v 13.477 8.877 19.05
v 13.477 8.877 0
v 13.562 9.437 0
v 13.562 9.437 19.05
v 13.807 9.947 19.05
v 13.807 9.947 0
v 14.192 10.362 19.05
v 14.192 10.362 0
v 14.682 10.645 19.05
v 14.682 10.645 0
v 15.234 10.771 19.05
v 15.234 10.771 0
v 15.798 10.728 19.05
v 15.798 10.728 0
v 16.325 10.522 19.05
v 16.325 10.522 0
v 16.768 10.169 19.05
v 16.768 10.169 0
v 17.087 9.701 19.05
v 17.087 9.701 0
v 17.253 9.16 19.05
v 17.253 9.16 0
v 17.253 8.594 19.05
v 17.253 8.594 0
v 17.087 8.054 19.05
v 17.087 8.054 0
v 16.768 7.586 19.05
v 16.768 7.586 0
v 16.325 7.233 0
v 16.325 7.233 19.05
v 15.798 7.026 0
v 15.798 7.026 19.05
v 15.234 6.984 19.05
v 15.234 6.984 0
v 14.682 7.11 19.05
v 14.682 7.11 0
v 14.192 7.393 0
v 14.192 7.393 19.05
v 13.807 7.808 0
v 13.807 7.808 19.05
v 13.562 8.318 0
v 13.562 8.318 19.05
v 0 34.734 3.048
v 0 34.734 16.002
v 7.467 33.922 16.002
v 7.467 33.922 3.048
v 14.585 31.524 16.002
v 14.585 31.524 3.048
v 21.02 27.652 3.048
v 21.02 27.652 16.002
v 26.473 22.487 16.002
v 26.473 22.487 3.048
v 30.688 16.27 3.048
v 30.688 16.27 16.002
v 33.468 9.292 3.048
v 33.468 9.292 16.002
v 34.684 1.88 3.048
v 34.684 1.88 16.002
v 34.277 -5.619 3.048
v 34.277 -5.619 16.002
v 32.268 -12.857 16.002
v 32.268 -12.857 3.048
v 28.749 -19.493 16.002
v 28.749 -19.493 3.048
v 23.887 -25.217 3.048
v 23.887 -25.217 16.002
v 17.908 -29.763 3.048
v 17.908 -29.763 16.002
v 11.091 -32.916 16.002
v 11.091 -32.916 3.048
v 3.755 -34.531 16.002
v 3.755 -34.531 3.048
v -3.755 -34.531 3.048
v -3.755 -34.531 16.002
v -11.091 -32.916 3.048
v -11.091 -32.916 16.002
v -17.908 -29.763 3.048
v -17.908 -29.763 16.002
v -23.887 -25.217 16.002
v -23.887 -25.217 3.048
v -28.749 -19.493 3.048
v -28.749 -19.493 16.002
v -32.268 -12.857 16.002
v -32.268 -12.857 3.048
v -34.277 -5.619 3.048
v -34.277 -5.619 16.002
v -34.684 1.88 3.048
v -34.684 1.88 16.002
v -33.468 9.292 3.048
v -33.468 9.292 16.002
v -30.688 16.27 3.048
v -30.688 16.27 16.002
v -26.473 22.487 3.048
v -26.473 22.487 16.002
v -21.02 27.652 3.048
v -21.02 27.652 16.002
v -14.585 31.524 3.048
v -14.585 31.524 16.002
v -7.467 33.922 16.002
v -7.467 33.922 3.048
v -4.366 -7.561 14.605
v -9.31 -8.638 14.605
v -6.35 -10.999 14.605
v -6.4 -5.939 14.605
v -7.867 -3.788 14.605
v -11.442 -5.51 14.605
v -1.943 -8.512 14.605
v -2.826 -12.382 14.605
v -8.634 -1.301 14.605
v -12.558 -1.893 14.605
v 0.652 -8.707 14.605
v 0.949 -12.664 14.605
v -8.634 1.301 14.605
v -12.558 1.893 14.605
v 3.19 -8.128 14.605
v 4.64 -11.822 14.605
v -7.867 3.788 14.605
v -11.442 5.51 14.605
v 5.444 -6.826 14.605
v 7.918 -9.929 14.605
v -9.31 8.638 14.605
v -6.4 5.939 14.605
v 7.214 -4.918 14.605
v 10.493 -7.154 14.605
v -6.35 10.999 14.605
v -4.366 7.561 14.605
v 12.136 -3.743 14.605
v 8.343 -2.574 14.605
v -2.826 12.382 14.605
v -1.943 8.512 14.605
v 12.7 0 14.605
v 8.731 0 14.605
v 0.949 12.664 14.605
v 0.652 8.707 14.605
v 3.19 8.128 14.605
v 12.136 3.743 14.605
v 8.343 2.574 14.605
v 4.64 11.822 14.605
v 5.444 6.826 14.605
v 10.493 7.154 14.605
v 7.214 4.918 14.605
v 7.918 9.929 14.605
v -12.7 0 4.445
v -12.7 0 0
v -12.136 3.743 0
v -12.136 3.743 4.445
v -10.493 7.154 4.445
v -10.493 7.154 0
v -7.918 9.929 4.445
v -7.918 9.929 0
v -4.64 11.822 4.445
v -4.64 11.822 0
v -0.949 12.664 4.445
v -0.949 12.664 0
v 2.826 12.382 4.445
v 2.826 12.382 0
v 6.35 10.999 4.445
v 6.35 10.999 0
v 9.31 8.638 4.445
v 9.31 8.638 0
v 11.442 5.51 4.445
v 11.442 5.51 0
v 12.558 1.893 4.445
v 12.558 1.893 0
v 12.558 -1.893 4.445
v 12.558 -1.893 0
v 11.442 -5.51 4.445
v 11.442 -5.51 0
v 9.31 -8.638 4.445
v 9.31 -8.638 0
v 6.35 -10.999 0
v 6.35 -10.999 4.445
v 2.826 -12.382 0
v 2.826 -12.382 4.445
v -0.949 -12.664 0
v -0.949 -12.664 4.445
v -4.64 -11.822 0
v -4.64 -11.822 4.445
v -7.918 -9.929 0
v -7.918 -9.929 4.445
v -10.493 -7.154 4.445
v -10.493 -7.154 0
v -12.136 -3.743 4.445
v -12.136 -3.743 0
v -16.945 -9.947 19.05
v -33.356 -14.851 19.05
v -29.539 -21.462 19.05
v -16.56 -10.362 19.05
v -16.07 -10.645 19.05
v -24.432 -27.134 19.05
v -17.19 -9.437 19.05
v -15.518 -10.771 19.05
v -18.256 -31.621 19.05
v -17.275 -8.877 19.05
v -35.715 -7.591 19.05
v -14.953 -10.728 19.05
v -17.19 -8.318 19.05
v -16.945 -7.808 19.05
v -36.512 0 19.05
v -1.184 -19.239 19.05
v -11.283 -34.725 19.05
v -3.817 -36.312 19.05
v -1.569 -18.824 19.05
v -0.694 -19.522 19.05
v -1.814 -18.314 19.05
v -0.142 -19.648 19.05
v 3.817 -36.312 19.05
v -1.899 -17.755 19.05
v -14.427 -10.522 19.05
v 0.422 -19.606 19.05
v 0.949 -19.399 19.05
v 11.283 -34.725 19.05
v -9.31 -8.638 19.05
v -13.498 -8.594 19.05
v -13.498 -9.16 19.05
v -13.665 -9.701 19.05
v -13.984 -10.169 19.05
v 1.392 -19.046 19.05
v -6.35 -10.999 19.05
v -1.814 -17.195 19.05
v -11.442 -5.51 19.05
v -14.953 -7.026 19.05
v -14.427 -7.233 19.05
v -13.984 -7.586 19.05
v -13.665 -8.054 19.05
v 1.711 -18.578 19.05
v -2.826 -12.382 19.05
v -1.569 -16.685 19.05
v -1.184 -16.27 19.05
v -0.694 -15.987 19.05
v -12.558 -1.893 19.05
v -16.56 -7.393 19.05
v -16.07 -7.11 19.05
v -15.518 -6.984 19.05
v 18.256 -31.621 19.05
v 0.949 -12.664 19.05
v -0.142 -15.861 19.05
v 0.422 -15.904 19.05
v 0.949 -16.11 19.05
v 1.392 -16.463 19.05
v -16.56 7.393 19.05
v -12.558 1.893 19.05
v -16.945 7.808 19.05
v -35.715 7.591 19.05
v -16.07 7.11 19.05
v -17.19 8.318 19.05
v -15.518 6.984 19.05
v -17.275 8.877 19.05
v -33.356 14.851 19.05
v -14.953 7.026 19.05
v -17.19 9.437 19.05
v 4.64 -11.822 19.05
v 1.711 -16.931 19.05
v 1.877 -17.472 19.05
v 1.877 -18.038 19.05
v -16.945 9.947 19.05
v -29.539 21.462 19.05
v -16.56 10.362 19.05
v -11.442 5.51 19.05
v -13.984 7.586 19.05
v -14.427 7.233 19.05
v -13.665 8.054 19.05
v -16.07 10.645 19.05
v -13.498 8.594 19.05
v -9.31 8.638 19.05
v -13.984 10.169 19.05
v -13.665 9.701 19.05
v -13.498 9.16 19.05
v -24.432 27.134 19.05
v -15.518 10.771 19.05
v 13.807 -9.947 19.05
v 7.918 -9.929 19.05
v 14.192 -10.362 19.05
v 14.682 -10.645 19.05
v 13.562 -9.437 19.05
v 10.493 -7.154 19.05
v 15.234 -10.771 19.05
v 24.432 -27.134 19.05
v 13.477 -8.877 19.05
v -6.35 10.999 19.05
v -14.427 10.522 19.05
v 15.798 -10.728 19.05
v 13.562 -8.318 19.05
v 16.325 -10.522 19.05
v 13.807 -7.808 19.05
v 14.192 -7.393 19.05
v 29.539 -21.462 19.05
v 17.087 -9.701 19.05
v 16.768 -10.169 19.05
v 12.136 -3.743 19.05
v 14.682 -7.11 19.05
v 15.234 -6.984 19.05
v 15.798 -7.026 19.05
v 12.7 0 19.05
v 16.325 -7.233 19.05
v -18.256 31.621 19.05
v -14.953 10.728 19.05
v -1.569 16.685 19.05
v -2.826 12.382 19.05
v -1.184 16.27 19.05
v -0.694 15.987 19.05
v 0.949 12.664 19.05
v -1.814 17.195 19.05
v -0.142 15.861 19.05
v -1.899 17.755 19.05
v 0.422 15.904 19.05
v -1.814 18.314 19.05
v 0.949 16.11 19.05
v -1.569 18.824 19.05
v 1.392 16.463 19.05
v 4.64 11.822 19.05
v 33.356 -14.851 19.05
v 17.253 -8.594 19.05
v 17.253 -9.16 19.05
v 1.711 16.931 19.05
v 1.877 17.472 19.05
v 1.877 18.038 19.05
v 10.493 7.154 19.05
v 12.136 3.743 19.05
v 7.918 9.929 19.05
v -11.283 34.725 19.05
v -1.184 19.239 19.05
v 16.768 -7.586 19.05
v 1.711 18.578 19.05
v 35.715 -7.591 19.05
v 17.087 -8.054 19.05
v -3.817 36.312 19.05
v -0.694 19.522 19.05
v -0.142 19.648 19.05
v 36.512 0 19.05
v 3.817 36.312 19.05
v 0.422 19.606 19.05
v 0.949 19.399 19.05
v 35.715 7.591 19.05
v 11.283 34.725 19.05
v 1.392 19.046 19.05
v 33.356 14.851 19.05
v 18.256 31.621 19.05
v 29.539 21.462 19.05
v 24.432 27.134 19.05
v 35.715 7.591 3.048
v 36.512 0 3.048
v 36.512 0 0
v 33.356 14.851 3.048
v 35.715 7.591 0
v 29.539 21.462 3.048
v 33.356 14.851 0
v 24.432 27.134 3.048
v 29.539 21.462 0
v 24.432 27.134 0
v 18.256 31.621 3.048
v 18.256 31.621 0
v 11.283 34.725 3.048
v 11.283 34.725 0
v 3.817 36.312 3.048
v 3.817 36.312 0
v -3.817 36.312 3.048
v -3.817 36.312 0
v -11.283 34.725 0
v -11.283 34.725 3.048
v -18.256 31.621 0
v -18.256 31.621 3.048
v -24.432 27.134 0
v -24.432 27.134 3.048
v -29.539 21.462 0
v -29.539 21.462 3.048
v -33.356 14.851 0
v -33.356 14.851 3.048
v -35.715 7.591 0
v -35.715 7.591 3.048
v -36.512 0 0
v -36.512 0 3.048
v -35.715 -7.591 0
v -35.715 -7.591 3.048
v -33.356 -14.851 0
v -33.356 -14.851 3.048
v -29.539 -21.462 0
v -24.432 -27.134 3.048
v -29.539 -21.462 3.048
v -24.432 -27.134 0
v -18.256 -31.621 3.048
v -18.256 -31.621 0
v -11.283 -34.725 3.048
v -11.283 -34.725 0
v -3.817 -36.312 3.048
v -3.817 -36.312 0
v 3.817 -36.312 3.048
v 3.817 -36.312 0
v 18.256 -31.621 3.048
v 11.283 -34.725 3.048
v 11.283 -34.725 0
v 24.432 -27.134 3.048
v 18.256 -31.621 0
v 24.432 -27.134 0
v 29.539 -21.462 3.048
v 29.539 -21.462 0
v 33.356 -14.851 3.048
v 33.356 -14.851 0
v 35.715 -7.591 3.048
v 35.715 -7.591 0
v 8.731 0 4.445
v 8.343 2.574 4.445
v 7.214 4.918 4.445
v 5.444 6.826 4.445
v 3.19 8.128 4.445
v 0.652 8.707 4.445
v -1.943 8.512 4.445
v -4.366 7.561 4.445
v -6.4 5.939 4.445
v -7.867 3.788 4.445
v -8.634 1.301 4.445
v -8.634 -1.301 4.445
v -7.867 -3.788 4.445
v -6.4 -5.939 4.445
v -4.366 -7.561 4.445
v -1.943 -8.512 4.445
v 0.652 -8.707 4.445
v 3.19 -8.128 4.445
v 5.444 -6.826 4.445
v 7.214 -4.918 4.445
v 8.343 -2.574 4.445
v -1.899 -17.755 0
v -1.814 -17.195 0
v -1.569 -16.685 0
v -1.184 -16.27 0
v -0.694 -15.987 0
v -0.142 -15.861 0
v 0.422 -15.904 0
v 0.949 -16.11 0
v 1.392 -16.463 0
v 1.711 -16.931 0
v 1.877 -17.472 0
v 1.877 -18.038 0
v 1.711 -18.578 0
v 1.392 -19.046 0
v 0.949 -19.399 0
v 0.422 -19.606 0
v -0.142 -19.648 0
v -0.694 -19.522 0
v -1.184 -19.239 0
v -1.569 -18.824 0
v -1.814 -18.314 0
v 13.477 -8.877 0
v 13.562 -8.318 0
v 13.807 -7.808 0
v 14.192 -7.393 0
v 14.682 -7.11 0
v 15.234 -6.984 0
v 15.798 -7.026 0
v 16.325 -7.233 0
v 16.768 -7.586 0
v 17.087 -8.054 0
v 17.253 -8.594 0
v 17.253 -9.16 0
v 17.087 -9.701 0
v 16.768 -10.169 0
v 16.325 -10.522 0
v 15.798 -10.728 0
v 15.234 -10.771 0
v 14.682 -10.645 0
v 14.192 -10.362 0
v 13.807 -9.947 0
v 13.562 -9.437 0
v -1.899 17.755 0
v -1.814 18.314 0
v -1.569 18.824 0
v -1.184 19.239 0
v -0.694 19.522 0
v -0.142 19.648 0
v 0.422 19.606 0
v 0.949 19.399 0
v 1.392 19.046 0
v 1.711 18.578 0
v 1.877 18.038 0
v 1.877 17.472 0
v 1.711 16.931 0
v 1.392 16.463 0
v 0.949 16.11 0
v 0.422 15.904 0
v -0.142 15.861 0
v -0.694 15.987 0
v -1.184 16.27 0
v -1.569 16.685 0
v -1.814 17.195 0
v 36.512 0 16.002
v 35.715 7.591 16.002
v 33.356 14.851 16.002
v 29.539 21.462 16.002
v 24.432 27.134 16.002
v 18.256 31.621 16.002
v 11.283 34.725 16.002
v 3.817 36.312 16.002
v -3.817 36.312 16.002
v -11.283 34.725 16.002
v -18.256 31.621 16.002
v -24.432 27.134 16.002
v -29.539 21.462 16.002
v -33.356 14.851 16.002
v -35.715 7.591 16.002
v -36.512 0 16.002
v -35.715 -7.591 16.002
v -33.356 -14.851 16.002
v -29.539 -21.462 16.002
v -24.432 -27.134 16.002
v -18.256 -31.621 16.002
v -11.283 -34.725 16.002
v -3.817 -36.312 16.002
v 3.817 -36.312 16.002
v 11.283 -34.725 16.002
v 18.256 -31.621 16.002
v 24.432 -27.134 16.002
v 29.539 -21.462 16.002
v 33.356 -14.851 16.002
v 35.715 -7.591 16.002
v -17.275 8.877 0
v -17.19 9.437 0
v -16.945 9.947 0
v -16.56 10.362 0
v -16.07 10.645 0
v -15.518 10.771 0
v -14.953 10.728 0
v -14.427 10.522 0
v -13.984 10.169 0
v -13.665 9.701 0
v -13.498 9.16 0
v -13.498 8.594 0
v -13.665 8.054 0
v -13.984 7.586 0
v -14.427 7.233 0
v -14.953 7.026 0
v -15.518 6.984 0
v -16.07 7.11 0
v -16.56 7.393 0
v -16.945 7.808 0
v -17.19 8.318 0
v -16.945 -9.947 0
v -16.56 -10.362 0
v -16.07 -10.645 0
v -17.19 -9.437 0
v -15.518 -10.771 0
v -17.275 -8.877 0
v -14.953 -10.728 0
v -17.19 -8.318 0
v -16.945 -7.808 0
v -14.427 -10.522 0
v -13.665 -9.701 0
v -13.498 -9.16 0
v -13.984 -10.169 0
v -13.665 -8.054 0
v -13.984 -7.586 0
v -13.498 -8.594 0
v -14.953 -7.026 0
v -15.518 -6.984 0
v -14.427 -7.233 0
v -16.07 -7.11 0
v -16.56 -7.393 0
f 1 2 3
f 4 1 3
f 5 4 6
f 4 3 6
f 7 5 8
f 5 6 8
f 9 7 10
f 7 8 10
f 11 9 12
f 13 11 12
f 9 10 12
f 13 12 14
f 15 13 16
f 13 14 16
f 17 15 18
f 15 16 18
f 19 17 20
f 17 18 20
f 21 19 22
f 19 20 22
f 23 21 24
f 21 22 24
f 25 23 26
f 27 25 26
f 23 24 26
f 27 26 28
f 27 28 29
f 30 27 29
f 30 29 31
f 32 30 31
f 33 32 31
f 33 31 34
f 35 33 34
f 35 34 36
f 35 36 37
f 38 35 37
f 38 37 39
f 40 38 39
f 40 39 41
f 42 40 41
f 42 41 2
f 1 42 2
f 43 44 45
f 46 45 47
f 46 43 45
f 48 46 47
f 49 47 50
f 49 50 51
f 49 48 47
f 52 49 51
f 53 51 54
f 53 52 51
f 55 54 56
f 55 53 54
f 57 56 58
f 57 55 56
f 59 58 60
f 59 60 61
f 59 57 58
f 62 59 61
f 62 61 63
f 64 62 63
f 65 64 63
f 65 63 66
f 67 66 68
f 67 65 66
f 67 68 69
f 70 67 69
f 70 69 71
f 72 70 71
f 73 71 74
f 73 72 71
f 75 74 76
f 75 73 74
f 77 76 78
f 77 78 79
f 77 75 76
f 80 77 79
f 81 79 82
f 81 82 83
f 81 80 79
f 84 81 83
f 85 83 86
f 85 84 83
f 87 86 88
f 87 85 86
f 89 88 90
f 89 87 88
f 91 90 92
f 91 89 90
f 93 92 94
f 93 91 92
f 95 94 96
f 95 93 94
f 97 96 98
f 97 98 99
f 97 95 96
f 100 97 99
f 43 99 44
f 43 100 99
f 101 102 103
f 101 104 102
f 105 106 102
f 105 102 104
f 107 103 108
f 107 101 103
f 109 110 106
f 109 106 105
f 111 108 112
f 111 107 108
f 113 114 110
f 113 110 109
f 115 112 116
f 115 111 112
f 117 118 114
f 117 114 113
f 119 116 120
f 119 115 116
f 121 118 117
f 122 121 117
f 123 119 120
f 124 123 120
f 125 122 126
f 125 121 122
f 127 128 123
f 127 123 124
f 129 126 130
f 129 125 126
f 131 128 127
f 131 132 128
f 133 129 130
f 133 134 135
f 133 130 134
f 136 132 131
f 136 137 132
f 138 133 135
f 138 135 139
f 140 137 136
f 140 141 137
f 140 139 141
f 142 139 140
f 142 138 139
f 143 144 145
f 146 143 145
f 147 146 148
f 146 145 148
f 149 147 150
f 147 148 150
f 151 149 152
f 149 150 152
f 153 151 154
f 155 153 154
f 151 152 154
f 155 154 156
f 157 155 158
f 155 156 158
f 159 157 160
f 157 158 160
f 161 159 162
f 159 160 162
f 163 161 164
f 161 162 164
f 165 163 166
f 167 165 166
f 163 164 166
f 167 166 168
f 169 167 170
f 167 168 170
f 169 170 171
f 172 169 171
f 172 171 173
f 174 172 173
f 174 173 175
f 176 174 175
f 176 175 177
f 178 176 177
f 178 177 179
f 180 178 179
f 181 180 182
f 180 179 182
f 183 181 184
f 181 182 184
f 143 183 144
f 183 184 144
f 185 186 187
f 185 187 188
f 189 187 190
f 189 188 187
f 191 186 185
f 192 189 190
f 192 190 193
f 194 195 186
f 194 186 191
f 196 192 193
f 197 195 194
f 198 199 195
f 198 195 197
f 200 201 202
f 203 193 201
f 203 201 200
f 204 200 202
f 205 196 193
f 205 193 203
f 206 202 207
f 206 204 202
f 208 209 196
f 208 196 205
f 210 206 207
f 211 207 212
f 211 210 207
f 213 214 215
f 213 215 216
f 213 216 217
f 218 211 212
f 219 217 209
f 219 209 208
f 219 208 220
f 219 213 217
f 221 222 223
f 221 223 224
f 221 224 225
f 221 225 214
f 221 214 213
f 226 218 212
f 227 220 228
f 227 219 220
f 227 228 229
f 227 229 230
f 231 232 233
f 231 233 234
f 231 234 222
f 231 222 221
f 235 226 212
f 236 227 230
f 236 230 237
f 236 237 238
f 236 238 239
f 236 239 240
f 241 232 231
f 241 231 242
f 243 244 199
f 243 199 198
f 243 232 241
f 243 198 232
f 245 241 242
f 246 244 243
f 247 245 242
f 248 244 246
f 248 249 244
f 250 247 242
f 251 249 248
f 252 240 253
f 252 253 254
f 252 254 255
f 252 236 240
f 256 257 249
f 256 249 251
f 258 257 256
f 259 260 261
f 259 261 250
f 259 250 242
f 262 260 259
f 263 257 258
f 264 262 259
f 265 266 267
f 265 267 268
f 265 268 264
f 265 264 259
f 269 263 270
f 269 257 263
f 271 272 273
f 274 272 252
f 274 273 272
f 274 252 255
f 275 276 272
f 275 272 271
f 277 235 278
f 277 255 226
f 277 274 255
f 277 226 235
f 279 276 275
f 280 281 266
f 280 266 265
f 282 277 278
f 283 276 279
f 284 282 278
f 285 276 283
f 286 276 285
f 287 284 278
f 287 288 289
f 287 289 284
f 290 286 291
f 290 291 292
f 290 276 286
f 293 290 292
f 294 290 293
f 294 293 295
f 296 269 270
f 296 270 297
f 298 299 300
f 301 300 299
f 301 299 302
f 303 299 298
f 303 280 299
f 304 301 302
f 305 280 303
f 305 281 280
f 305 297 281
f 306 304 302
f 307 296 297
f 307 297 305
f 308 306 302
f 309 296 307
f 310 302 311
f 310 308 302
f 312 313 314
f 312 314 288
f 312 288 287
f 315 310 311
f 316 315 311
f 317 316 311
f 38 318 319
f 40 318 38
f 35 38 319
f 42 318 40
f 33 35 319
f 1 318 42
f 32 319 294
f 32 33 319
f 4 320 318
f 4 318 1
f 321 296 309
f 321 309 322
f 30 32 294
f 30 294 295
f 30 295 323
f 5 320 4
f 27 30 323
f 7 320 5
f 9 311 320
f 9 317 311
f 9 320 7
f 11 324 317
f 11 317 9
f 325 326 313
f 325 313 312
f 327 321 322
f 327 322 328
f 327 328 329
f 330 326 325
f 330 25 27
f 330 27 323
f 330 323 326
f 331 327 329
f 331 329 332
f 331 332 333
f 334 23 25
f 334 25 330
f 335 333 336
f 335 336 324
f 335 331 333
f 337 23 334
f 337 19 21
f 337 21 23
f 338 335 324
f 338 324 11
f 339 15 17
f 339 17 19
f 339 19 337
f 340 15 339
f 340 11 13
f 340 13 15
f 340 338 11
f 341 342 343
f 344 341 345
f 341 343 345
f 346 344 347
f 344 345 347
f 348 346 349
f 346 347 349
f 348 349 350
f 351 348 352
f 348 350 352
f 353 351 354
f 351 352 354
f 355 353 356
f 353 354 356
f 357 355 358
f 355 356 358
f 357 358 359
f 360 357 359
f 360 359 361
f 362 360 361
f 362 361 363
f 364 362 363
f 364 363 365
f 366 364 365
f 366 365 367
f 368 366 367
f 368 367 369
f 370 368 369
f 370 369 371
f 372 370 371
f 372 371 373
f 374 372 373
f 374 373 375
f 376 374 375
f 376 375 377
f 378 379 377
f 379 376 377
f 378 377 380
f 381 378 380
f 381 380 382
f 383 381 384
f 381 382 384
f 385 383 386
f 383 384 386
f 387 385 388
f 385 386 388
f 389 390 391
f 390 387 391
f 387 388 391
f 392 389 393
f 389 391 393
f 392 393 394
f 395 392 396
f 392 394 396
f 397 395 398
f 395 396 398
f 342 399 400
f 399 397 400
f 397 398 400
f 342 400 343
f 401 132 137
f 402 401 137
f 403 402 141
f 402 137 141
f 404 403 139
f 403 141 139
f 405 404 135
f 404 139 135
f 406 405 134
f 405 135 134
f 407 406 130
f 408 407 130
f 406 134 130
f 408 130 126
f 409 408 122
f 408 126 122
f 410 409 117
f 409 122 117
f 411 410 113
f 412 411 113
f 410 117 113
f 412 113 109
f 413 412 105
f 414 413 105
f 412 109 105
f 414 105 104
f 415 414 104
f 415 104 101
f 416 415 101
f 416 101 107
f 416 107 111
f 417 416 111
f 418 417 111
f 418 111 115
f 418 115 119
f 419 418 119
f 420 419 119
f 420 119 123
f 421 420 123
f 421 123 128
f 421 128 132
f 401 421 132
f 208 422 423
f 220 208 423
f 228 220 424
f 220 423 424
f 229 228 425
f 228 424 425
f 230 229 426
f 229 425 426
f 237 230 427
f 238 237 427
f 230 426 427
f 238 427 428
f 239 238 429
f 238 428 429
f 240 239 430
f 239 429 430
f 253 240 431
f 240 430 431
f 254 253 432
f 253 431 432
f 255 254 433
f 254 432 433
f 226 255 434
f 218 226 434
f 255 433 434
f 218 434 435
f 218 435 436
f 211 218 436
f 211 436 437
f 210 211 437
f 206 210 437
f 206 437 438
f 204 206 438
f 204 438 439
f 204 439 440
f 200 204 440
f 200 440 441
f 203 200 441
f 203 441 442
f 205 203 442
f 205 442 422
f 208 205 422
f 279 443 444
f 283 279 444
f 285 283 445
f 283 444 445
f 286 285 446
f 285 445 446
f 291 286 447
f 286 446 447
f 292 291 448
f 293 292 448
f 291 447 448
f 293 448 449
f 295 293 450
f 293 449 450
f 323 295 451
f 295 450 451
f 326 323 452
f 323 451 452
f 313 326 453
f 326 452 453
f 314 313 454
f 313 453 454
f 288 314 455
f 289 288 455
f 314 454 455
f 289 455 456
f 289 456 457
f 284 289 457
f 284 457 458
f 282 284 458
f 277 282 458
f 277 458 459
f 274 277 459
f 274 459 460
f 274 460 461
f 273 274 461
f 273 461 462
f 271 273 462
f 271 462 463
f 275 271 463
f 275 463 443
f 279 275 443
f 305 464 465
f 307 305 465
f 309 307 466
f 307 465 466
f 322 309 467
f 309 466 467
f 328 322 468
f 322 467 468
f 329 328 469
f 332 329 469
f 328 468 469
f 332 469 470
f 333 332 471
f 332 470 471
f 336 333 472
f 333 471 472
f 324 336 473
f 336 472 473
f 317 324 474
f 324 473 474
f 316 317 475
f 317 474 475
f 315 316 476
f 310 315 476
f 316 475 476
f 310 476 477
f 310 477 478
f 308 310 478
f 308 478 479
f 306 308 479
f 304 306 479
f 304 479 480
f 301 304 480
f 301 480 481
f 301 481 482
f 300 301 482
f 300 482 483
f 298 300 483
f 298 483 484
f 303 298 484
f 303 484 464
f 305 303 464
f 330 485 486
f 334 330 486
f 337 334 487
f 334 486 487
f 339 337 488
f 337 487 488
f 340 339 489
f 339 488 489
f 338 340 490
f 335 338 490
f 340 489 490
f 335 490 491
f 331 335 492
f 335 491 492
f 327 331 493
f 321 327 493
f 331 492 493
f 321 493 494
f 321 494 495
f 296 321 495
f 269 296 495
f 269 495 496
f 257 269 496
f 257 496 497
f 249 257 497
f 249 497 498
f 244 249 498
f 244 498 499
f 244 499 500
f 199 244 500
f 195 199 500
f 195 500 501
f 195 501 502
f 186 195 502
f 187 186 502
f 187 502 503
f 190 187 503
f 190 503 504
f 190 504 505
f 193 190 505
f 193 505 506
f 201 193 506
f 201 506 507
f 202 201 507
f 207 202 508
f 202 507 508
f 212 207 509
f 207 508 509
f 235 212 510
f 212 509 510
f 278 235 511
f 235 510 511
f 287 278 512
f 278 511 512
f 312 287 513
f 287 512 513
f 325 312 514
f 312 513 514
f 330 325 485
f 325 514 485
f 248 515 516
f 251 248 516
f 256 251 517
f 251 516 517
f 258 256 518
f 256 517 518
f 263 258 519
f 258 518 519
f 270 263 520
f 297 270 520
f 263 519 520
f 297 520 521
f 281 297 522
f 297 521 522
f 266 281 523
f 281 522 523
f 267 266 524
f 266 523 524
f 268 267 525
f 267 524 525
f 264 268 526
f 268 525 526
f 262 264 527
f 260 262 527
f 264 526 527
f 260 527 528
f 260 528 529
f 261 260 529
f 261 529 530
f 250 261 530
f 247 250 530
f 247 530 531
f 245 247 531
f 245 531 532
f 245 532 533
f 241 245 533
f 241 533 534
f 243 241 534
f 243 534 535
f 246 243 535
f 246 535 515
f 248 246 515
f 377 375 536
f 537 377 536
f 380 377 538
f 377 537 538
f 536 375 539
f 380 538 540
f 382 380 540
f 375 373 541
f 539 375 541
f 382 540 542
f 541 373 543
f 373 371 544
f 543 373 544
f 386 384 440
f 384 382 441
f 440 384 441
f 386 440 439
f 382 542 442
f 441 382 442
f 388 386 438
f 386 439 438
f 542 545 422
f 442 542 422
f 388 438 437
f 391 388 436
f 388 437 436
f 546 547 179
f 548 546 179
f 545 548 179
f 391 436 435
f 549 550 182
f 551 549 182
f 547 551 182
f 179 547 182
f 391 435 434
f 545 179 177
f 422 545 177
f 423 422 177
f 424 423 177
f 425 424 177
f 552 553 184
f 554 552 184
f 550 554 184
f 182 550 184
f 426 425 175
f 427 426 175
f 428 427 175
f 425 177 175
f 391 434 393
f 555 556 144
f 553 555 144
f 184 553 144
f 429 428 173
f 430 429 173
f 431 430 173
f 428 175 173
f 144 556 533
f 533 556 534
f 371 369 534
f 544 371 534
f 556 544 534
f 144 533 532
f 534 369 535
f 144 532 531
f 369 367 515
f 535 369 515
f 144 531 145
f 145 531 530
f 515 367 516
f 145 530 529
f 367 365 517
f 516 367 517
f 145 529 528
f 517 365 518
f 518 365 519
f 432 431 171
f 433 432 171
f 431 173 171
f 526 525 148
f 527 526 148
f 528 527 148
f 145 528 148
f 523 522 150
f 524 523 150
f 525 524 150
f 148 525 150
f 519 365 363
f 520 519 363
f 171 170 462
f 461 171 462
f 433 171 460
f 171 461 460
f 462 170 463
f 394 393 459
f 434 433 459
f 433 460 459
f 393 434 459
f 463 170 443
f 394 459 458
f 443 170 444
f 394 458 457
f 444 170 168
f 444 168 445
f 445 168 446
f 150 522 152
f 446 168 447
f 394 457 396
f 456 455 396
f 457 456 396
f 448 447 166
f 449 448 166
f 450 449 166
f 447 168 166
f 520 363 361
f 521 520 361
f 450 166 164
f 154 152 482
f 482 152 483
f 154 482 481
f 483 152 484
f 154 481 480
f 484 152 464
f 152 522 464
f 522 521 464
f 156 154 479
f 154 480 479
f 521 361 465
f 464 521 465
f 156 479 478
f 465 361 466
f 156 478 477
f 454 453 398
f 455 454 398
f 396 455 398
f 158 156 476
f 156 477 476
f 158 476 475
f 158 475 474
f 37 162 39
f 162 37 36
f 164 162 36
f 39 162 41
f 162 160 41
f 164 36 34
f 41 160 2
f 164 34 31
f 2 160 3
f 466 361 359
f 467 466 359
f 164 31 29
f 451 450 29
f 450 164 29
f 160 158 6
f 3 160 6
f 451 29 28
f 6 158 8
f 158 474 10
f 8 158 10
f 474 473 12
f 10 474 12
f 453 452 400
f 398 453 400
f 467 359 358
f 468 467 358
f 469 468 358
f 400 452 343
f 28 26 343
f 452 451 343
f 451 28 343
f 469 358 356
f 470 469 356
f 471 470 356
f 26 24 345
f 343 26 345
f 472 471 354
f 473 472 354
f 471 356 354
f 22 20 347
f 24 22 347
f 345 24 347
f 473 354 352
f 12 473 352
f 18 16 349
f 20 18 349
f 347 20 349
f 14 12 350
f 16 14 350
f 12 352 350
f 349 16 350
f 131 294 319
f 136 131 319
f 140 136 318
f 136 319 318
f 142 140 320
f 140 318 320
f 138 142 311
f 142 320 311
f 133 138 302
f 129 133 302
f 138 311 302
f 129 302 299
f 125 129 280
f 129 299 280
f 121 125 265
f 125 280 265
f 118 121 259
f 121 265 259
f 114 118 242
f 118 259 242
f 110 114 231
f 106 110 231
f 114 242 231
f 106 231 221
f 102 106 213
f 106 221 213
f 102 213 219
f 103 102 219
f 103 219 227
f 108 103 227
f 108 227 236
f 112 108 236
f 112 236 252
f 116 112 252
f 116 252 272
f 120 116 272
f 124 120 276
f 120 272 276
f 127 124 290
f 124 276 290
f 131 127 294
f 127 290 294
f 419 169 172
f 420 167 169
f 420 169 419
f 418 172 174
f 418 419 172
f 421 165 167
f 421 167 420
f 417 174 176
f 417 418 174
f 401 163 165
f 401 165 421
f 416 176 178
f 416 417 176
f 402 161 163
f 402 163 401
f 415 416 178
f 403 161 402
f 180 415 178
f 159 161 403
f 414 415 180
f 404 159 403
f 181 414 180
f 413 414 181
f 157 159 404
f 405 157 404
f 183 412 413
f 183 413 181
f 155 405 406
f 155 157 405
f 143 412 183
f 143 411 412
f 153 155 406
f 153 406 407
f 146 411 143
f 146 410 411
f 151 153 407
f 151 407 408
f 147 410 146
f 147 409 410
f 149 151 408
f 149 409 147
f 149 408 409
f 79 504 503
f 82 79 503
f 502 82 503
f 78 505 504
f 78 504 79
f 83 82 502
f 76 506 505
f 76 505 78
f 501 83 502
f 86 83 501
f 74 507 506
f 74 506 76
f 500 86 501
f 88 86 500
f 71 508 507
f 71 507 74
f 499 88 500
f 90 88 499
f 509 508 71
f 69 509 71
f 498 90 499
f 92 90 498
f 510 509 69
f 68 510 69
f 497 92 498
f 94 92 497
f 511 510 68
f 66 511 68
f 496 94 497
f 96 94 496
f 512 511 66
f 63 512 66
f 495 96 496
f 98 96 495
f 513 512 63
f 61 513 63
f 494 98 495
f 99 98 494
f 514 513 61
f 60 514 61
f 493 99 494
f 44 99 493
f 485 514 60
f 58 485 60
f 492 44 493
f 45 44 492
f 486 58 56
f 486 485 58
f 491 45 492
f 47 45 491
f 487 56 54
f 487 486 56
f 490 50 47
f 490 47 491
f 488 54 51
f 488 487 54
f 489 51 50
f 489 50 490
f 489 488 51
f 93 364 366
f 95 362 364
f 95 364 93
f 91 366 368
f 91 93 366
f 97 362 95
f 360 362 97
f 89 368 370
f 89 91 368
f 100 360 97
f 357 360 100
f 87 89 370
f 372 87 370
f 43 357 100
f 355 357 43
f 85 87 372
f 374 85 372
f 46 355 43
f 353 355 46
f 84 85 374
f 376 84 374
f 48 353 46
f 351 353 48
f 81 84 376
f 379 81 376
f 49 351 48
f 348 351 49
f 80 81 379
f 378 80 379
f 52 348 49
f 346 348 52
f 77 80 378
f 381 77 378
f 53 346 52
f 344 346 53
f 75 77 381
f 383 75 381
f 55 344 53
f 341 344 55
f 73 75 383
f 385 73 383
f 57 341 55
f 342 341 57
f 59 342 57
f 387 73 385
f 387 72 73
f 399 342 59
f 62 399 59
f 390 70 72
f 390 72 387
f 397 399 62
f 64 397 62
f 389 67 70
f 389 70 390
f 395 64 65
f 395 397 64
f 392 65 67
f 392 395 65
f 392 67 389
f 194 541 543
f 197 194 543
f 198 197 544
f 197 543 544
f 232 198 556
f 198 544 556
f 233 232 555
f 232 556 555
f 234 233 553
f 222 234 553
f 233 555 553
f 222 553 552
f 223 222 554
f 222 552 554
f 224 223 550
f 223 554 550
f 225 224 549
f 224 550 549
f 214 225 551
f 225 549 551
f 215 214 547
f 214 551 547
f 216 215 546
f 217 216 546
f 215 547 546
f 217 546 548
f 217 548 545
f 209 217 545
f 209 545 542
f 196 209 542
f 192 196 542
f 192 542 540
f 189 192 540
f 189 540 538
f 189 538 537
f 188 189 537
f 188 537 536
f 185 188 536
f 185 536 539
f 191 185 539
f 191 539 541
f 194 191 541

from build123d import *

# Parameters (mm, degrees)
SKETCH1_R             = 36.5125
BOSS_EXTRUDE1_DEPTH   = 19.05
SKETCH2_R             = 8.73125
CUT_EXTRUDE1_DEPTH    = 20.05
SKETCH3_R             = 12.7
CUT_EXTRUDE2_DEPTH    = 4.445
SKETCH4_R             = 12.7
CUT_EXTRUDE3_DEPTH    = 4.445
F_6_CLEARANCE_HOLE1_D = 3.7973


with BuildPart() as part:
    # Sketch1 → Boss-Extrude1 (new body)
    with BuildSketch(Plane.XY):
        Circle(SKETCH1_R)
    extrude(amount=BOSS_EXTRUDE1_DEPTH)

    # Sketch2 → Cut-Extrude1 (cut, through all)
    with BuildSketch(Plane.XY.offset(19.05)):
        Circle(SKETCH2_R)
    extrude(amount=-CUT_EXTRUDE1_DEPTH, mode=Mode.SUBTRACT)

    # Sketch3 → Cut-Extrude2 (cut)
    with BuildSketch(Plane.XY.offset(19.05)):
        Circle(SKETCH3_R)
    extrude(amount=-CUT_EXTRUDE2_DEPTH, mode=Mode.SUBTRACT)

    # Sketch4 → Cut-Extrude3 (cut)
    with BuildSketch(Plane(origin=(0, 0, 0), x_dir=(-1, 0, 0), z_dir=(0, 0, -1))):
        Circle(SKETCH4_R)
    extrude(amount=-CUT_EXTRUDE3_DEPTH, mode=Mode.SUBTRACT)

    # #6 Clearance Hole1 (through all)
    with Locations(Plane(origin=(-8.170302988, -47.003517203, 19.05), x_dir=(1, 0, 0), z_dir=(0, 0, 1))):
        with Locations((8.170302988, 64.758117203), (-7.205631646, 55.880817203), (-7.205631646, 38.126217203), (8.170302988, 29.248917203), (23.546237622, 38.126217203), (23.546237622, 55.880817203)):
            Hole(F_6_CLEARANCE_HOLE1_D / 2)

    # Sketch10 → Cut-Revolve1 (revolve, cut)
    with BuildSketch(Plane(origin=(0, 0, 0), x_dir=(0, 0, -1), z_dir=(1, 0, 0))):
        Polygon((-16.002, 36.5125), (-16.002, 34.7345), (-3.048, 34.7345), (-3.048, 36.5125), (-3.048, 51.152208686), (-16.002, 51.152208686), align=None)
    revolve(axis=Axis((0, 0, 19.05), (0, 0, -1)), mode=Mode.SUBTRACT)


solid = part.part
